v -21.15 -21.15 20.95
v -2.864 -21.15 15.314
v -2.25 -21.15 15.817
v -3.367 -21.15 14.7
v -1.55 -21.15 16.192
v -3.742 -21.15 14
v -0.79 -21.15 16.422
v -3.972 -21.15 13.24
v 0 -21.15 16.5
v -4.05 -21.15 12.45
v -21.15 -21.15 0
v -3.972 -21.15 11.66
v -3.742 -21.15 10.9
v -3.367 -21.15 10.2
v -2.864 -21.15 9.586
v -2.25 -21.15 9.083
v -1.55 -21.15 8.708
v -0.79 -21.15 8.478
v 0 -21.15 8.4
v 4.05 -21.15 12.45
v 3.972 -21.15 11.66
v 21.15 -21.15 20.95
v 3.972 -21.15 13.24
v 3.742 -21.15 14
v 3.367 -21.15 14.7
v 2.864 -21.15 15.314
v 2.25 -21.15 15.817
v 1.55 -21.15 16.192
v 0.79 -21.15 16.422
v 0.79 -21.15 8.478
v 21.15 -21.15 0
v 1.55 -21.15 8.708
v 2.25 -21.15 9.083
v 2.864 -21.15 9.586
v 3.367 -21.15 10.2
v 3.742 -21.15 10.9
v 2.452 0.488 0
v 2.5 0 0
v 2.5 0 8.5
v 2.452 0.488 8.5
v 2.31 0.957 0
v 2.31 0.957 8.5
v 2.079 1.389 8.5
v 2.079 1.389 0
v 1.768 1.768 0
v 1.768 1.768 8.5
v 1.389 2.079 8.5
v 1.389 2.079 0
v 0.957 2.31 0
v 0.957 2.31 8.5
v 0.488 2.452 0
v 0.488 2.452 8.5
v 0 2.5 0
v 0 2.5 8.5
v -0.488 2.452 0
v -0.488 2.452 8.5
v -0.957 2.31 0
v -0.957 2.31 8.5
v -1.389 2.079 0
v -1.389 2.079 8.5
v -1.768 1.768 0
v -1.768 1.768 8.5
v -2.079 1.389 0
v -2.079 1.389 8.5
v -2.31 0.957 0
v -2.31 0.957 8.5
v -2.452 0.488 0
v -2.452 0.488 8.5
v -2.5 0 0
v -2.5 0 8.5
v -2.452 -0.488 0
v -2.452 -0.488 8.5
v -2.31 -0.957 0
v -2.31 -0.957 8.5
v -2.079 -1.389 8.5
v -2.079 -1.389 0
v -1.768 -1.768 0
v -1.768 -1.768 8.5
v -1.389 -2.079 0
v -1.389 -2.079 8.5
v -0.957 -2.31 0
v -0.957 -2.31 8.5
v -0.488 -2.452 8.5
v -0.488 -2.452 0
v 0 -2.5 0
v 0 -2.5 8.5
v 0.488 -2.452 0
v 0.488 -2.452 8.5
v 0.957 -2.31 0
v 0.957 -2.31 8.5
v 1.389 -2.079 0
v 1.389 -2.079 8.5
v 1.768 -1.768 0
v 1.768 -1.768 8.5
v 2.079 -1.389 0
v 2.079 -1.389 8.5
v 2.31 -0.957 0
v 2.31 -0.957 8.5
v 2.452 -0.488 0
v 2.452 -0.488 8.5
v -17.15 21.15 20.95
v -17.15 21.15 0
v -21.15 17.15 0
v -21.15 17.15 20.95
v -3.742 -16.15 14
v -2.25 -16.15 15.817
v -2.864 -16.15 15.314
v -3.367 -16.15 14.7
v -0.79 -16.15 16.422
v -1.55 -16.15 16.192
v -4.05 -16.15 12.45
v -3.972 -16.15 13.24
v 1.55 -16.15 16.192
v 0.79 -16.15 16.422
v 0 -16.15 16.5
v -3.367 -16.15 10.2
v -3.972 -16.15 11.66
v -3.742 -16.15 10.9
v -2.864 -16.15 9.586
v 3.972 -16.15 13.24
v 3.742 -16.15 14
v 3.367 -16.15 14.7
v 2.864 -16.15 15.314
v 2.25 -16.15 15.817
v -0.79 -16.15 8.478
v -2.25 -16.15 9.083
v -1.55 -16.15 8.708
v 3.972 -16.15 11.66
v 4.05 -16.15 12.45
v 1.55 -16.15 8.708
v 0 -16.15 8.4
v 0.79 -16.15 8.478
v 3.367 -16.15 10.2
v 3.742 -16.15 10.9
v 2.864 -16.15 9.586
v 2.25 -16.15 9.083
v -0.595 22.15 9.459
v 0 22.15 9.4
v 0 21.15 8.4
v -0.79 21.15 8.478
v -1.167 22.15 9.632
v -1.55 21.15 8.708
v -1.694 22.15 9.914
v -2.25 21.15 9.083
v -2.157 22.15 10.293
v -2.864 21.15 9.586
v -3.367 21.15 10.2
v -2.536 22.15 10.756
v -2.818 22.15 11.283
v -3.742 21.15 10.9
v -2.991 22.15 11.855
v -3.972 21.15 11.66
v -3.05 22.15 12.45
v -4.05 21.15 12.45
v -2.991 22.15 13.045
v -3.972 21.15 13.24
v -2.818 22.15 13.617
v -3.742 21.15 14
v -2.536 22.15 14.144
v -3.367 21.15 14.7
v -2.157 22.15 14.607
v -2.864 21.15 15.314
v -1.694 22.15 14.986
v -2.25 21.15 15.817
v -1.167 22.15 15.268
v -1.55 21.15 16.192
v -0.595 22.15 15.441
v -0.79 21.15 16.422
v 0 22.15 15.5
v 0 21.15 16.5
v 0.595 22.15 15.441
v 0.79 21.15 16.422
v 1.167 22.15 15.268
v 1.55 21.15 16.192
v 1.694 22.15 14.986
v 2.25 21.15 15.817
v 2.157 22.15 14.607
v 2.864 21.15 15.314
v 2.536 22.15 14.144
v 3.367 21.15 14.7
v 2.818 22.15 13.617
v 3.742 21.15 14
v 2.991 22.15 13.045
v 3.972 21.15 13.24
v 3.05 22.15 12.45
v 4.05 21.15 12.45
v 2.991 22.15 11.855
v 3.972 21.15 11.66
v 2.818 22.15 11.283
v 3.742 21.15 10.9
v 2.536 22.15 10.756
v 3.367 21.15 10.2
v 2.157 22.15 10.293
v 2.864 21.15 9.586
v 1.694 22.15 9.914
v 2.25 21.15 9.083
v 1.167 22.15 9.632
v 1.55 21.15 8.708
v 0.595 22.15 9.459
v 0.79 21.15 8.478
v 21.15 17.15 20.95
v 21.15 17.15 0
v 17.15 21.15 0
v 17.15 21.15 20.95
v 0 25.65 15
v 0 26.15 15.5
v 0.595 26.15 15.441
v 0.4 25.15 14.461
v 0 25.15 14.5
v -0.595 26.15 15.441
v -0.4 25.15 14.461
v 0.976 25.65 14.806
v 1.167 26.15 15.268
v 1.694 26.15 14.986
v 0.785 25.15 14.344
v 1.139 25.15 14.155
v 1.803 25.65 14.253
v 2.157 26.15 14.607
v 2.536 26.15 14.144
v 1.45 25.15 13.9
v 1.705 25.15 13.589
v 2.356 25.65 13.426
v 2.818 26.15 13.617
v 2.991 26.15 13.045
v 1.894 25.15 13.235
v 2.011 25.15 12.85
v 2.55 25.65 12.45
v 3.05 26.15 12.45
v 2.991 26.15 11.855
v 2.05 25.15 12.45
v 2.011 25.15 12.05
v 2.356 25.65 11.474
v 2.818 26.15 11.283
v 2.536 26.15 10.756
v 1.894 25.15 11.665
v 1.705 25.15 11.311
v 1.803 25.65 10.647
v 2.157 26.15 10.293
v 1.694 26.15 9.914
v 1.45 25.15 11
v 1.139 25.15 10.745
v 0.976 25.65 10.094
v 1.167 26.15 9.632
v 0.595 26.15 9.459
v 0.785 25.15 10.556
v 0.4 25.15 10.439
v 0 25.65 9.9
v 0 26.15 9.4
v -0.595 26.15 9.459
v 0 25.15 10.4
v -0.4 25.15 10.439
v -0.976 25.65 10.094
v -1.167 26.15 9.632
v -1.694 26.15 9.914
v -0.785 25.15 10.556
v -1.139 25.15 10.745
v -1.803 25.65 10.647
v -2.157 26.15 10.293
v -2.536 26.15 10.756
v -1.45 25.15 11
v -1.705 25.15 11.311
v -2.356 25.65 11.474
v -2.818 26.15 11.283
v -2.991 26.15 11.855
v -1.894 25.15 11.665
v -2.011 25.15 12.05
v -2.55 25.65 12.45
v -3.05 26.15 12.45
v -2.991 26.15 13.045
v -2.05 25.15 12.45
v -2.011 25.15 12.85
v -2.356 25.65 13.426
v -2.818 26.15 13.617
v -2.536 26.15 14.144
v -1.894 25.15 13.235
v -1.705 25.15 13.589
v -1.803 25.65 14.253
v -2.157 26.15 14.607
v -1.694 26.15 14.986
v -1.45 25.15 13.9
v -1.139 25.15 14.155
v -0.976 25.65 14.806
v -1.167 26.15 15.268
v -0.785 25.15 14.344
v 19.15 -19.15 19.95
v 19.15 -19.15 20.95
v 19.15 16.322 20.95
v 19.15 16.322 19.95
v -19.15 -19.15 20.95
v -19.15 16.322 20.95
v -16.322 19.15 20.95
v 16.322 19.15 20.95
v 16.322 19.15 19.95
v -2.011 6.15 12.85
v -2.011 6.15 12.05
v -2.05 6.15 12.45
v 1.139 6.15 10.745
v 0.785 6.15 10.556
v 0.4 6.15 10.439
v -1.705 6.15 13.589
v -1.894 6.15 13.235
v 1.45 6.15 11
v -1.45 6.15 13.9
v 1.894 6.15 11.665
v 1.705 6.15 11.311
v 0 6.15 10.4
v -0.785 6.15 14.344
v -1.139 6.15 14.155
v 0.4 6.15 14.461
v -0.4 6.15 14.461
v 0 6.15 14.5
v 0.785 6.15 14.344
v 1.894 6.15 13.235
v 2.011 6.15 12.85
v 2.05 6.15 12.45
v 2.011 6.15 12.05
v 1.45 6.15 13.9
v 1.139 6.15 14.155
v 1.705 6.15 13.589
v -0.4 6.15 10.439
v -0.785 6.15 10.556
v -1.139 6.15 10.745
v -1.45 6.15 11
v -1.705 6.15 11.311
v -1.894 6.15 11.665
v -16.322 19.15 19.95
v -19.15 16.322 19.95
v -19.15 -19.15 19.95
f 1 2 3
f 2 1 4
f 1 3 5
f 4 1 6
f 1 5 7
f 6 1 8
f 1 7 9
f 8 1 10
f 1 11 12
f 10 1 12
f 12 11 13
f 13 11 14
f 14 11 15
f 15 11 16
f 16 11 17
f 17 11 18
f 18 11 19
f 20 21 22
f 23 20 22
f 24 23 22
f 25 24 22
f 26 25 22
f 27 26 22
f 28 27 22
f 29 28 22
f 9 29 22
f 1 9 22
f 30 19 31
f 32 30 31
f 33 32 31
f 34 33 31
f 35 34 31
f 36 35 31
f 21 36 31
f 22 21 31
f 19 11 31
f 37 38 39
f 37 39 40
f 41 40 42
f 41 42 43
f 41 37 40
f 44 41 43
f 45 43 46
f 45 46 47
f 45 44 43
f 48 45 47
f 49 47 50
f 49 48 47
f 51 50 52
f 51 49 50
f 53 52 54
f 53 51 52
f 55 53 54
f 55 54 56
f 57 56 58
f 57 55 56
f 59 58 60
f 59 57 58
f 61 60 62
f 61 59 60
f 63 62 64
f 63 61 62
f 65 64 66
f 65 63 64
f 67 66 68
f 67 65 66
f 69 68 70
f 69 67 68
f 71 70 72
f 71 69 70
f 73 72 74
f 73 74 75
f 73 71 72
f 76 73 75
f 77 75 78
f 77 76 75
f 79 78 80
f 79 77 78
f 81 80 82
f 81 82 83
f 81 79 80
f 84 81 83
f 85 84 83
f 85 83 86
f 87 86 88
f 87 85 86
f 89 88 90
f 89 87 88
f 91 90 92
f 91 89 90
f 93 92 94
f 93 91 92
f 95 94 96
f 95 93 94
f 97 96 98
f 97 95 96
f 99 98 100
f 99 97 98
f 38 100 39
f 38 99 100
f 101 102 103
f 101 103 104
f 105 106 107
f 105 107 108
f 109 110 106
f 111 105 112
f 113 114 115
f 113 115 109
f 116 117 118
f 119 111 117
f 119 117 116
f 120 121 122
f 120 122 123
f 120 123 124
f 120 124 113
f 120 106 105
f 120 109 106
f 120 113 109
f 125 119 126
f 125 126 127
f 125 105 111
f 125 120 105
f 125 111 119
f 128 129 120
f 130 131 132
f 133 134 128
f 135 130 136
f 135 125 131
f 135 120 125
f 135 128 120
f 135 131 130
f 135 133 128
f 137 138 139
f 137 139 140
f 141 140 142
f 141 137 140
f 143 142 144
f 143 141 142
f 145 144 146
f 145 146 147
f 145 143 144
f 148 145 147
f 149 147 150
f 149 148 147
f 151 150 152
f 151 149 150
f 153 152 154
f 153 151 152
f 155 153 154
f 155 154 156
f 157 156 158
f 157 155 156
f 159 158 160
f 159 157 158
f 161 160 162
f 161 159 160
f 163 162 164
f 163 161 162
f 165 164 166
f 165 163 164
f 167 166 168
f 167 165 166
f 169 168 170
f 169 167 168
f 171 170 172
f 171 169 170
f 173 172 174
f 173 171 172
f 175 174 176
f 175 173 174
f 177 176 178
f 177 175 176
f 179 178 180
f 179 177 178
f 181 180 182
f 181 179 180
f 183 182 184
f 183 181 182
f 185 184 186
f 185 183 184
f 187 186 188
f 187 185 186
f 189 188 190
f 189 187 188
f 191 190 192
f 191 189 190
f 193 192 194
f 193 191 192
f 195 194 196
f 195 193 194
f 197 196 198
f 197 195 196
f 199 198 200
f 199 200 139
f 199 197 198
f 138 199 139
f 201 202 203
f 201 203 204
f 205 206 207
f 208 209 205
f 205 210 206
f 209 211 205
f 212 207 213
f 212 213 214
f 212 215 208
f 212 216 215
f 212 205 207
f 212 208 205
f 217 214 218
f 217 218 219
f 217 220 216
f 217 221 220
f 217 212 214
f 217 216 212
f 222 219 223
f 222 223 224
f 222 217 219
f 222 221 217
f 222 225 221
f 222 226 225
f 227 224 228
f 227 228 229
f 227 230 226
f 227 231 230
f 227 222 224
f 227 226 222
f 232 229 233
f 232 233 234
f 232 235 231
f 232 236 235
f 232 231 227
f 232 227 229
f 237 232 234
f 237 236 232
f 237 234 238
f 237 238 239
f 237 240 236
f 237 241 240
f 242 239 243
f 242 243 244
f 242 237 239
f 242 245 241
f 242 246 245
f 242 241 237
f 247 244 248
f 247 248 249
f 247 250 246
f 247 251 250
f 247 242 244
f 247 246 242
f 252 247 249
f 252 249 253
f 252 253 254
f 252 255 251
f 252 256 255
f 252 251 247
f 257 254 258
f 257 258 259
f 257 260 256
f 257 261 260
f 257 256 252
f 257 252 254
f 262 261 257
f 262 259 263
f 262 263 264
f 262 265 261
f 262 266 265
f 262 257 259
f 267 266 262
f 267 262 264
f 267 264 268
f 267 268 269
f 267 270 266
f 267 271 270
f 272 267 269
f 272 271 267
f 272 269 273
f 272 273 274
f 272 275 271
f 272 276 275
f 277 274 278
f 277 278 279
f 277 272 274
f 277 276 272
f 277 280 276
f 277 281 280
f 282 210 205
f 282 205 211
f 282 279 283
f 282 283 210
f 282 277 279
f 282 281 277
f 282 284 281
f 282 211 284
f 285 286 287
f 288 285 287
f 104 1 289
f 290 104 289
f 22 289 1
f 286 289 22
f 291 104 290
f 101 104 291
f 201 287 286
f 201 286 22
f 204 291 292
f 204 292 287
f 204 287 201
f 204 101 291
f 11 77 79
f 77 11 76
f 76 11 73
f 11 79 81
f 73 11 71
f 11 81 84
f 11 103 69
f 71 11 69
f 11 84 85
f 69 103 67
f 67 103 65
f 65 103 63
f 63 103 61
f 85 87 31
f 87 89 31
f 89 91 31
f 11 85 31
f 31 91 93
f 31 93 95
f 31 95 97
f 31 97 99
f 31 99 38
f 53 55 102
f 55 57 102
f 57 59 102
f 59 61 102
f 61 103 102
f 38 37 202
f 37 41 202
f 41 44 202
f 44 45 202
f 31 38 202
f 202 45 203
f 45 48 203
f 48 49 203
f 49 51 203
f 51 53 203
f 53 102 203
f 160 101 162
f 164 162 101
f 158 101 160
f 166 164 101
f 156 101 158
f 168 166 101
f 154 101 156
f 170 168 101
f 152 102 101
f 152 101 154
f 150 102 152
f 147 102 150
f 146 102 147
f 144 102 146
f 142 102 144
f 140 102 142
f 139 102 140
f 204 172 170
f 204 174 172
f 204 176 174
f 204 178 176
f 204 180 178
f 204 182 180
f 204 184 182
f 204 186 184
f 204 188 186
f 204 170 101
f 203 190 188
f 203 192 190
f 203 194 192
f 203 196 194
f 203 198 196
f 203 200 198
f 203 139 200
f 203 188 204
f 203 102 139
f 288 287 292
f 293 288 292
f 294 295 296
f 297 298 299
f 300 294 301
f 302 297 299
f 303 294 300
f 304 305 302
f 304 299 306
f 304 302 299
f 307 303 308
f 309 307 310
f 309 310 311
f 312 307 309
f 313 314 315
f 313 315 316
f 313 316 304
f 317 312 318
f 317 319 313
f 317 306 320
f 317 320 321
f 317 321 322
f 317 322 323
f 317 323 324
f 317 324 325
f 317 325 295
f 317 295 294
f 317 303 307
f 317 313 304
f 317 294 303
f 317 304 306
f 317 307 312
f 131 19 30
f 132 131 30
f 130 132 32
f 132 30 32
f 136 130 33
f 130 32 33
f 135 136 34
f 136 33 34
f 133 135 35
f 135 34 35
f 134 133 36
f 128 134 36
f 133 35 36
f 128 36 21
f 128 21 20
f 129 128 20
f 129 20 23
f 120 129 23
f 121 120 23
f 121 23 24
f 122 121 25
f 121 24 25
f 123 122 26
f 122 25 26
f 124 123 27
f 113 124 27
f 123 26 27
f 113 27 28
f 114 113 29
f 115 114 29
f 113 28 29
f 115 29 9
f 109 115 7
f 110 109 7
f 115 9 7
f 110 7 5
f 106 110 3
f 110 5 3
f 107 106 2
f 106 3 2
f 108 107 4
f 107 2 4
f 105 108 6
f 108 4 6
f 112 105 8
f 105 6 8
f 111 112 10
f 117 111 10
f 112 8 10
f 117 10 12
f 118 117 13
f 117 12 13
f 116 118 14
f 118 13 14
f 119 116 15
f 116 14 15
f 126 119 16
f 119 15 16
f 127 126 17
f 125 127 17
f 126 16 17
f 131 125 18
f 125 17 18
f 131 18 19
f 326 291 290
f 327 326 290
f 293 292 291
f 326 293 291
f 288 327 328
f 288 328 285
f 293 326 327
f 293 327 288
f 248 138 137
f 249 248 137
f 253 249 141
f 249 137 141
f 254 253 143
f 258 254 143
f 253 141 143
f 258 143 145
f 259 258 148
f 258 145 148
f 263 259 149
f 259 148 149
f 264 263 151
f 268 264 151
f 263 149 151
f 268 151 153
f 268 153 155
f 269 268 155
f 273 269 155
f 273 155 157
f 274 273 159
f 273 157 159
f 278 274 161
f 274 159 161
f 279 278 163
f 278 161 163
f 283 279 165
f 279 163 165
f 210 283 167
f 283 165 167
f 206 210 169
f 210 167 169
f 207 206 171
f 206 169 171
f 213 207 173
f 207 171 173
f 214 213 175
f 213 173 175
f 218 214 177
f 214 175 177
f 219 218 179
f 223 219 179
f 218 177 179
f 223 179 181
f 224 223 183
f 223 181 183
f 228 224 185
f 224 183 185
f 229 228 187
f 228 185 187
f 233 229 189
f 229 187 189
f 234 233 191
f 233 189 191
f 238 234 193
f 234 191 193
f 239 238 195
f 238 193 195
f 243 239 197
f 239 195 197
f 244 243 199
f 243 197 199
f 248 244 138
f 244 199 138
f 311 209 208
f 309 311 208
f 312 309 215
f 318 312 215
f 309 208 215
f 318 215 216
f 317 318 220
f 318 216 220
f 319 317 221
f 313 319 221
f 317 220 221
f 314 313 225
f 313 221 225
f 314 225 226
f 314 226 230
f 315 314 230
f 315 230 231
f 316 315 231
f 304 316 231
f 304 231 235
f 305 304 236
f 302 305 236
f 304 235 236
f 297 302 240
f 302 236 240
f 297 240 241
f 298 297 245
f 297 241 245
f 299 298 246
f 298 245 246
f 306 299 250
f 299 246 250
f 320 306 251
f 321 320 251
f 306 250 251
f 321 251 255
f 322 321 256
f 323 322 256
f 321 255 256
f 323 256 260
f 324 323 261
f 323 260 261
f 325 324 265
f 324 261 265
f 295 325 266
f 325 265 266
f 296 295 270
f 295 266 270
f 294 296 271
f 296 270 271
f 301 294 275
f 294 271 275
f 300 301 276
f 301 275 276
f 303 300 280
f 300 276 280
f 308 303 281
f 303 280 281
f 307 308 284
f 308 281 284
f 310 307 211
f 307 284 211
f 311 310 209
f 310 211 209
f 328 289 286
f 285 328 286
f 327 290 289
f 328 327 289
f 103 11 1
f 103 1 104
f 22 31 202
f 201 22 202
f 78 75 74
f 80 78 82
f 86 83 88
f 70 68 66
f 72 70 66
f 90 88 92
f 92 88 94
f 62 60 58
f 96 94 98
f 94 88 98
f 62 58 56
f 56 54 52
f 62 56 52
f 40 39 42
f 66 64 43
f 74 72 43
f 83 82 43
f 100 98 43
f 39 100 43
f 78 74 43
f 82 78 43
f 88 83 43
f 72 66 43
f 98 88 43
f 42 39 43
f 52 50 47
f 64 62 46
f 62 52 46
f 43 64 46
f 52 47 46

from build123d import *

# Parameters (mm, degrees)
SKETCH3_W           = 42.3
SKETCH3_H           = 42.3
BOSS_EXTRUDE1_DEPTH = 20.95
SKETCH4_R           = 4.05
CUT_EXTRUDE1_DEPTH  = 5
SKETCH5_R           = 2.5
CUT_EXTRUDE2_DEPTH  = 8.5
SKETCH6_R           = 3.05
BOSS_EXTRUDE2_DEPTH = 5
SKETCH7_R           = 2.05
CUT_EXTRUDE3_DEPTH  = 20
CHAMFER1_SIZE       = 4
CHAMFER3_SIZE       = 1
CUT_EXTRUDE4_DEPTH  = 1


with BuildPart() as part:
    # Sketch3 → Boss-Extrude1 (new body)
    with BuildSketch(Plane.XY):
        Rectangle(SKETCH3_W, SKETCH3_H)
    extrude(amount=BOSS_EXTRUDE1_DEPTH)

    # Sketch4 → Cut-Extrude1 (cut)
    with BuildSketch(Plane.XZ.offset(21.15)):
        with Locations(Location((0, 12.45, 0), (0, 0, 270))):
            Circle(SKETCH4_R)
    extrude(amount=-CUT_EXTRUDE1_DEPTH, mode=Mode.SUBTRACT)

    # Sketch5 → Cut-Extrude2 (cut)
    with BuildSketch(Plane.XY):
        Circle(SKETCH5_R)
    extrude(amount=CUT_EXTRUDE2_DEPTH, mode=Mode.SUBTRACT)

    # Sketch6 → Boss-Extrude2 (add)
    with BuildSketch(Plane(origin=(0, 21.15, 0), x_dir=(1, 0, 0), z_dir=(0, 1, 0))):
        with Locations(Location((0, -12.45, 0), (0, 0, 90))):
            Circle(SKETCH6_R)
    extrude(amount=BOSS_EXTRUDE2_DEPTH)

    # Sketch7 → Cut-Extrude3 (cut)
    with BuildSketch(Plane(origin=(0, 26.15, 0), x_dir=(1, 0, 0), z_dir=(0, 1, 0))):
        with Locations(Location((0, -12.45, 0), (0, 0, 270))):
            Circle(SKETCH7_R)
    extrude(amount=-CUT_EXTRUDE3_DEPTH, mode=Mode.SUBTRACT)

    # Chamfer1
    chamfer1_edges = [part.edges().sort_by_distance(p)[0] for p in [
        (21.15, 21.15, 10.475),
        (-21.15, 21.15, 10.475),
    ]]
    chamfer(chamfer1_edges, length=CHAMFER1_SIZE)

    # Chamfer3
    chamfer3_edges = [part.edges().sort_by_distance(p)[0] for p in [
        (0, 21.15, 15.5),
        (0, 26.15, 10.4),
    ]]
    chamfer(chamfer3_edges, length=CHAMFER3_SIZE - 0.0001)  # a hair under: the kernel refuses the full size

    # Sketch10 → Cut-Extrude4 (cut)
    with BuildSketch(Plane.XY.offset(20.95)):
        Polygon((19.15, -19.15), (19.15, 16.321572875), (16.321572875, 19.15), (-16.321572875, 19.15), (-19.15, 16.321572875), (-19.15, -19.15), align=None)
    extrude(amount=-CUT_EXTRUDE4_DEPTH, mode=Mode.SUBTRACT)


solid = part.part
